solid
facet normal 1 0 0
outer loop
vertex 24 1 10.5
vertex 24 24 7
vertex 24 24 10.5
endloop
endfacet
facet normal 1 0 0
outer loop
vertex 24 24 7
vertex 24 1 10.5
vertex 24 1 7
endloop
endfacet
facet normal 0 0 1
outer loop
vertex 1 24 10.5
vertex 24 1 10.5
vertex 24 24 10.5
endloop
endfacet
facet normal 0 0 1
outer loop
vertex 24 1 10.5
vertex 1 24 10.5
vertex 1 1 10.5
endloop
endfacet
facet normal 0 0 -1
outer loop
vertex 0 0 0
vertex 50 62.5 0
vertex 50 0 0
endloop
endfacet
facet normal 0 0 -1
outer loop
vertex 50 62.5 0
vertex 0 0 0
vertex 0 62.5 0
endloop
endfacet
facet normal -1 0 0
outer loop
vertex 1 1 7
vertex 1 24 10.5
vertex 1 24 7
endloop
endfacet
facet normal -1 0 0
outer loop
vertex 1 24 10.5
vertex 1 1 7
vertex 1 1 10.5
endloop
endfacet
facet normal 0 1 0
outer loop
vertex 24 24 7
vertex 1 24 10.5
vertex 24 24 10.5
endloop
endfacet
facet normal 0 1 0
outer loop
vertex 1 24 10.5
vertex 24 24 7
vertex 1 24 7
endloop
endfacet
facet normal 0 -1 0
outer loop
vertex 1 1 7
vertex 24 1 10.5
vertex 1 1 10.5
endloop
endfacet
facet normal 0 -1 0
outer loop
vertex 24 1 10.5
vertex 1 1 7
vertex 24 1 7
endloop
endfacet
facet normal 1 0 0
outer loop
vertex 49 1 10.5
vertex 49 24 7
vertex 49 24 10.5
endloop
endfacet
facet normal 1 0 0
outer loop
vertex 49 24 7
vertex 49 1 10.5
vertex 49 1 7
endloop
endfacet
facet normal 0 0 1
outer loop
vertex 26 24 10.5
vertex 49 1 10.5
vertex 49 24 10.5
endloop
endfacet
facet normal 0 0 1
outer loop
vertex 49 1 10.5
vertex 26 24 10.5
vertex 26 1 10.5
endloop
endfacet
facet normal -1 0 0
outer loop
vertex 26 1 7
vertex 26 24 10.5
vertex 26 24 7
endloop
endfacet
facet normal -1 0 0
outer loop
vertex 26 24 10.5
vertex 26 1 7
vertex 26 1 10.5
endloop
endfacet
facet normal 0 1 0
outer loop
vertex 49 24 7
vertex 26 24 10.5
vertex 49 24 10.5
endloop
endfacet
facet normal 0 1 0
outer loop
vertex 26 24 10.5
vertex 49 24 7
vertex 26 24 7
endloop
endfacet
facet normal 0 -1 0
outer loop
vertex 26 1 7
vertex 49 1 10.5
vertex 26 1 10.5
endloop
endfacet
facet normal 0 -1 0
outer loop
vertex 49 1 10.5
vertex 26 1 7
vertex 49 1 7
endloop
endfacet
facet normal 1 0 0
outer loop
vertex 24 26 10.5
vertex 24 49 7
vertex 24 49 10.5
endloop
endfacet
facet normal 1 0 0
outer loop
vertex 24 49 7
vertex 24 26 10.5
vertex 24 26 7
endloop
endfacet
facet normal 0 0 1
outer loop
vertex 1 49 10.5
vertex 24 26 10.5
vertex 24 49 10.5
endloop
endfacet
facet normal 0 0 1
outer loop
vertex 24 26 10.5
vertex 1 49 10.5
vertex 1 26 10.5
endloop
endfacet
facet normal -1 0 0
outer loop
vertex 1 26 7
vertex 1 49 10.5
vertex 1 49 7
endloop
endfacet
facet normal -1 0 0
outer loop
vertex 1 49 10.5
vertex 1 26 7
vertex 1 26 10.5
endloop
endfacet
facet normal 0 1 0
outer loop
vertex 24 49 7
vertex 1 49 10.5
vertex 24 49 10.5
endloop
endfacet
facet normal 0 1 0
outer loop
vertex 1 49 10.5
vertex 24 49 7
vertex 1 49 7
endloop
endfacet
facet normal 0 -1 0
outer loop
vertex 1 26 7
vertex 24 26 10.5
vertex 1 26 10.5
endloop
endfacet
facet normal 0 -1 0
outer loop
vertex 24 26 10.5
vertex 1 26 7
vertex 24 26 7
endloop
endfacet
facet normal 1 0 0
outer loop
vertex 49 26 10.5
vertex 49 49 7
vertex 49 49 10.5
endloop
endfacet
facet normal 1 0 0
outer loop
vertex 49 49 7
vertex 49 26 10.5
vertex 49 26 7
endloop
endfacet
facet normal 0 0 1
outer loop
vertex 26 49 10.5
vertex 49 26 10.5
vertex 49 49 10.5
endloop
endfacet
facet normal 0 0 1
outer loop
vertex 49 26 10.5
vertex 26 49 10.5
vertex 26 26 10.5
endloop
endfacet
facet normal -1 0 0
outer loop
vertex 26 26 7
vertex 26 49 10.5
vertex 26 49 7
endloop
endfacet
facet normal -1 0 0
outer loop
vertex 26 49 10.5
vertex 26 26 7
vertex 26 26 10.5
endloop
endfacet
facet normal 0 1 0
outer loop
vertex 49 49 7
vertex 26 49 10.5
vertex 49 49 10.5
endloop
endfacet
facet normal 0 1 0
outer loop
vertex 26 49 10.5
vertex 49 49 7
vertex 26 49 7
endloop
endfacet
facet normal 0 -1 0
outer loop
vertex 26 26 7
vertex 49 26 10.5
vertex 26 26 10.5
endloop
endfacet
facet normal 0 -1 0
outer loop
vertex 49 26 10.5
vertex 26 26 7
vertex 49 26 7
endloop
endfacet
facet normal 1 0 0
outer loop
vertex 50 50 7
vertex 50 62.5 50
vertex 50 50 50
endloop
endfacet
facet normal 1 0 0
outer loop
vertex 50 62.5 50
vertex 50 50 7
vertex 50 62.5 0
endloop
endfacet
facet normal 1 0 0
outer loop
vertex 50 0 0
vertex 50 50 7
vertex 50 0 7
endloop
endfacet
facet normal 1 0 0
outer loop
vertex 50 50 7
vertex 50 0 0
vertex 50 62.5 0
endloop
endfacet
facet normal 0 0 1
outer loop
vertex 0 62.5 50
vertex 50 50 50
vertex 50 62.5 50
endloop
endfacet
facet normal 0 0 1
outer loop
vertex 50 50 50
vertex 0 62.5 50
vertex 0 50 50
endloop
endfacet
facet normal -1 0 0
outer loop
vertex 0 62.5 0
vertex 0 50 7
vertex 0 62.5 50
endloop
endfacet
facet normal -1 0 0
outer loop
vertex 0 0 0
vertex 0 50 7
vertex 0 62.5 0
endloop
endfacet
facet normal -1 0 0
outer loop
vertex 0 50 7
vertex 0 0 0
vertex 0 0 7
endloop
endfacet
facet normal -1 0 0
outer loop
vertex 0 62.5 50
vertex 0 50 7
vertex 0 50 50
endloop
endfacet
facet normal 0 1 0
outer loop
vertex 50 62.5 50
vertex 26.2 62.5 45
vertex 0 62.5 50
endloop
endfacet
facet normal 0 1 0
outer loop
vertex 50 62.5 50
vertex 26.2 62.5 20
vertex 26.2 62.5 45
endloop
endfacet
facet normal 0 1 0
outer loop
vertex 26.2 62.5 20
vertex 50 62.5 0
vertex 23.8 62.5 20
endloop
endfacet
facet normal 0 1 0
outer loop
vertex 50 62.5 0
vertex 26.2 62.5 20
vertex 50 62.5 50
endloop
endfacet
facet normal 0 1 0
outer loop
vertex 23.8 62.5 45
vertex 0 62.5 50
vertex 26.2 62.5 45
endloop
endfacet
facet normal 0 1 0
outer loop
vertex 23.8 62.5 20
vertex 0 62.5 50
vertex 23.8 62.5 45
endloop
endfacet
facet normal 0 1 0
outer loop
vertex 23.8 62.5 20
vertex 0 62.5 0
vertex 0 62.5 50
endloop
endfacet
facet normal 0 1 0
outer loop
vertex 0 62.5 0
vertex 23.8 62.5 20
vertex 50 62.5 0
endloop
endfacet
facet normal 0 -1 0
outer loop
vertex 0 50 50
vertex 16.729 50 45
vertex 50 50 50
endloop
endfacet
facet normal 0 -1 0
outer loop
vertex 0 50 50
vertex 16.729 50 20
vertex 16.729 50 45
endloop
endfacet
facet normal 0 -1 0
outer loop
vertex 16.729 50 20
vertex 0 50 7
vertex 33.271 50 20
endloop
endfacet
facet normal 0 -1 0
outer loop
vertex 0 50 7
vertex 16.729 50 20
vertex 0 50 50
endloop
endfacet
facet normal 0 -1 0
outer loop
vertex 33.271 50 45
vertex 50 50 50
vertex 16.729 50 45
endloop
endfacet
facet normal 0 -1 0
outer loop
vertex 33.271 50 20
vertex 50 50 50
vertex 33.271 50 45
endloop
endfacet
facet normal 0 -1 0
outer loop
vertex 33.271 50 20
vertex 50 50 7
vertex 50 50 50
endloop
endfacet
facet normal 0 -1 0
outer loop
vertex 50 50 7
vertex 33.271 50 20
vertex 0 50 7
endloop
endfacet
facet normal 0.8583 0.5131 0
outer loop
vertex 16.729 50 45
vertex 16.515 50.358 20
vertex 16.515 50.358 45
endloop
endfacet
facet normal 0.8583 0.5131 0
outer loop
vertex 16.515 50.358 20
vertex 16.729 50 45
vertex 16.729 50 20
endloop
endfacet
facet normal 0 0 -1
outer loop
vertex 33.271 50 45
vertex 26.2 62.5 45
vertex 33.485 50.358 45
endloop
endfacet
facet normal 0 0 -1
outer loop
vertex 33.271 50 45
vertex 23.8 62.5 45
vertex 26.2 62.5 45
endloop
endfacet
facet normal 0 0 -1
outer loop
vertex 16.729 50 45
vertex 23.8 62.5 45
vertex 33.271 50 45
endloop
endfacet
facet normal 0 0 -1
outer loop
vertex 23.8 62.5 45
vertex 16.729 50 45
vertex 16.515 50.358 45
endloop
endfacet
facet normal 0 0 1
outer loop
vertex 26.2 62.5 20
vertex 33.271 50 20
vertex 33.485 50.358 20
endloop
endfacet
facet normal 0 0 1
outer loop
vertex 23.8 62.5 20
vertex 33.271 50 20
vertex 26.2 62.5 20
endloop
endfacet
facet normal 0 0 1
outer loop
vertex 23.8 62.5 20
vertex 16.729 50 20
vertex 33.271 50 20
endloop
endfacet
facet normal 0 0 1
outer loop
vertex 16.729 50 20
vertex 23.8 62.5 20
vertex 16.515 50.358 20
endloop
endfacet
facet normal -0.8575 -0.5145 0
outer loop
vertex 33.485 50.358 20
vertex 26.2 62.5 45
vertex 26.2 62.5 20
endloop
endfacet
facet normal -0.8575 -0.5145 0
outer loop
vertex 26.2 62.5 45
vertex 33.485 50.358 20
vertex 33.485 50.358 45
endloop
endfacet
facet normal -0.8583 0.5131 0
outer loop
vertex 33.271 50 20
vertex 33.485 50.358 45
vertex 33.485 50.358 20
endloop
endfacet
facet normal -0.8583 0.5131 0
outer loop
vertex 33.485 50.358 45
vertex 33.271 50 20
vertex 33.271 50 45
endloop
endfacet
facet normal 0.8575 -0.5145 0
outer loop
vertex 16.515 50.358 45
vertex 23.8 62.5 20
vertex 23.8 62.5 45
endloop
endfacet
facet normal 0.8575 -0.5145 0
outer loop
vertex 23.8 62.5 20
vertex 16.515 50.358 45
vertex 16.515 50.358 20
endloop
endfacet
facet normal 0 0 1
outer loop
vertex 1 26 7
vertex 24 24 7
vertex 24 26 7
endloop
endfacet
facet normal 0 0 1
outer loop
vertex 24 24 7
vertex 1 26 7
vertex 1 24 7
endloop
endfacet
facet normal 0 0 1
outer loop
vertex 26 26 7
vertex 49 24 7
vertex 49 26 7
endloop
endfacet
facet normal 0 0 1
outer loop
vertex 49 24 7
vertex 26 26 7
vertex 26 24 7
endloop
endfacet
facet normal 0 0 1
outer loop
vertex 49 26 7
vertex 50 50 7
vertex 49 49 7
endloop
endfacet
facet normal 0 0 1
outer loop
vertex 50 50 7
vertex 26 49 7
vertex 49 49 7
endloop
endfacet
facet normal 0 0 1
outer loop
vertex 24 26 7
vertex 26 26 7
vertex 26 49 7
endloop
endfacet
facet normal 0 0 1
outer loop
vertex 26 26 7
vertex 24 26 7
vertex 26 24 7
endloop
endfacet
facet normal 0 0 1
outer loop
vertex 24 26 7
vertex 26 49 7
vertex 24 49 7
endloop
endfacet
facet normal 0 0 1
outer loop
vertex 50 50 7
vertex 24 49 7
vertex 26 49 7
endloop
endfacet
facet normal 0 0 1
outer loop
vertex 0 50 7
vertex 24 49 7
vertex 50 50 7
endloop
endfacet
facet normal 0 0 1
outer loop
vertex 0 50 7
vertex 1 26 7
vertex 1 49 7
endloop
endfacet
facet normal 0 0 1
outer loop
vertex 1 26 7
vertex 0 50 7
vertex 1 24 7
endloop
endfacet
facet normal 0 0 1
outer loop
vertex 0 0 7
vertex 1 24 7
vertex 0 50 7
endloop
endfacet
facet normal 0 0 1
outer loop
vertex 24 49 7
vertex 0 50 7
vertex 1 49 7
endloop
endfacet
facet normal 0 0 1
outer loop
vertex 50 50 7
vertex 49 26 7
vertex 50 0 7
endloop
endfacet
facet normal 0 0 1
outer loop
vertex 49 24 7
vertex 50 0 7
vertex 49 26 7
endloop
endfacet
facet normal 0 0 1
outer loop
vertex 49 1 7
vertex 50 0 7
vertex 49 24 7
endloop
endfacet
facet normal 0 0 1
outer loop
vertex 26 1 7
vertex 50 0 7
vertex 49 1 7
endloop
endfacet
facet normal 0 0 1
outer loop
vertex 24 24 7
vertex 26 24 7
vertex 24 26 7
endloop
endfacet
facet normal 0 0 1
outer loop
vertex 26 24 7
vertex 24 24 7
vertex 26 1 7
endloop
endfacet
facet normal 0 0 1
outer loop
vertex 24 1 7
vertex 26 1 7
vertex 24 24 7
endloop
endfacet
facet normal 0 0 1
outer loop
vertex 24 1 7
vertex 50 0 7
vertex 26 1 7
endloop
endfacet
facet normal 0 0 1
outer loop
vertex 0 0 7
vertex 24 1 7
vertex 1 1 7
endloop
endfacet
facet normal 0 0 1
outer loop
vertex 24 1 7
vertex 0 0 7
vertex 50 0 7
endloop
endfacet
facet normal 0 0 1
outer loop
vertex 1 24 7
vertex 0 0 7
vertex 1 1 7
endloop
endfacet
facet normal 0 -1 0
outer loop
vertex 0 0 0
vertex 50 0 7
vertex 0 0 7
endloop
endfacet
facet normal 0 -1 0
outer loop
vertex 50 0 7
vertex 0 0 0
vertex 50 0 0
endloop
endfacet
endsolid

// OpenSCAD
color("LightGray") {
    translate([1,1,0]) cube([23,23,6+4.5]);
    translate([25+1,1,0]) cube([23,23,6+4.5]);
    translate([1,25+1,0]) cube([23,23,6+4.5]);
    translate([25+1,25+1,0]) cube([23,23,6+4.5]);
}
color("Grey") {
    cube([50,50,7]);
    difference() {
        translate([0,50,0]) cube([50,12.5,50]);
        translate([25,52+12.5,20]) scale([.6,1,1]) rotate([0,0,180+45]) cube([20,20,25]);
    }
}
